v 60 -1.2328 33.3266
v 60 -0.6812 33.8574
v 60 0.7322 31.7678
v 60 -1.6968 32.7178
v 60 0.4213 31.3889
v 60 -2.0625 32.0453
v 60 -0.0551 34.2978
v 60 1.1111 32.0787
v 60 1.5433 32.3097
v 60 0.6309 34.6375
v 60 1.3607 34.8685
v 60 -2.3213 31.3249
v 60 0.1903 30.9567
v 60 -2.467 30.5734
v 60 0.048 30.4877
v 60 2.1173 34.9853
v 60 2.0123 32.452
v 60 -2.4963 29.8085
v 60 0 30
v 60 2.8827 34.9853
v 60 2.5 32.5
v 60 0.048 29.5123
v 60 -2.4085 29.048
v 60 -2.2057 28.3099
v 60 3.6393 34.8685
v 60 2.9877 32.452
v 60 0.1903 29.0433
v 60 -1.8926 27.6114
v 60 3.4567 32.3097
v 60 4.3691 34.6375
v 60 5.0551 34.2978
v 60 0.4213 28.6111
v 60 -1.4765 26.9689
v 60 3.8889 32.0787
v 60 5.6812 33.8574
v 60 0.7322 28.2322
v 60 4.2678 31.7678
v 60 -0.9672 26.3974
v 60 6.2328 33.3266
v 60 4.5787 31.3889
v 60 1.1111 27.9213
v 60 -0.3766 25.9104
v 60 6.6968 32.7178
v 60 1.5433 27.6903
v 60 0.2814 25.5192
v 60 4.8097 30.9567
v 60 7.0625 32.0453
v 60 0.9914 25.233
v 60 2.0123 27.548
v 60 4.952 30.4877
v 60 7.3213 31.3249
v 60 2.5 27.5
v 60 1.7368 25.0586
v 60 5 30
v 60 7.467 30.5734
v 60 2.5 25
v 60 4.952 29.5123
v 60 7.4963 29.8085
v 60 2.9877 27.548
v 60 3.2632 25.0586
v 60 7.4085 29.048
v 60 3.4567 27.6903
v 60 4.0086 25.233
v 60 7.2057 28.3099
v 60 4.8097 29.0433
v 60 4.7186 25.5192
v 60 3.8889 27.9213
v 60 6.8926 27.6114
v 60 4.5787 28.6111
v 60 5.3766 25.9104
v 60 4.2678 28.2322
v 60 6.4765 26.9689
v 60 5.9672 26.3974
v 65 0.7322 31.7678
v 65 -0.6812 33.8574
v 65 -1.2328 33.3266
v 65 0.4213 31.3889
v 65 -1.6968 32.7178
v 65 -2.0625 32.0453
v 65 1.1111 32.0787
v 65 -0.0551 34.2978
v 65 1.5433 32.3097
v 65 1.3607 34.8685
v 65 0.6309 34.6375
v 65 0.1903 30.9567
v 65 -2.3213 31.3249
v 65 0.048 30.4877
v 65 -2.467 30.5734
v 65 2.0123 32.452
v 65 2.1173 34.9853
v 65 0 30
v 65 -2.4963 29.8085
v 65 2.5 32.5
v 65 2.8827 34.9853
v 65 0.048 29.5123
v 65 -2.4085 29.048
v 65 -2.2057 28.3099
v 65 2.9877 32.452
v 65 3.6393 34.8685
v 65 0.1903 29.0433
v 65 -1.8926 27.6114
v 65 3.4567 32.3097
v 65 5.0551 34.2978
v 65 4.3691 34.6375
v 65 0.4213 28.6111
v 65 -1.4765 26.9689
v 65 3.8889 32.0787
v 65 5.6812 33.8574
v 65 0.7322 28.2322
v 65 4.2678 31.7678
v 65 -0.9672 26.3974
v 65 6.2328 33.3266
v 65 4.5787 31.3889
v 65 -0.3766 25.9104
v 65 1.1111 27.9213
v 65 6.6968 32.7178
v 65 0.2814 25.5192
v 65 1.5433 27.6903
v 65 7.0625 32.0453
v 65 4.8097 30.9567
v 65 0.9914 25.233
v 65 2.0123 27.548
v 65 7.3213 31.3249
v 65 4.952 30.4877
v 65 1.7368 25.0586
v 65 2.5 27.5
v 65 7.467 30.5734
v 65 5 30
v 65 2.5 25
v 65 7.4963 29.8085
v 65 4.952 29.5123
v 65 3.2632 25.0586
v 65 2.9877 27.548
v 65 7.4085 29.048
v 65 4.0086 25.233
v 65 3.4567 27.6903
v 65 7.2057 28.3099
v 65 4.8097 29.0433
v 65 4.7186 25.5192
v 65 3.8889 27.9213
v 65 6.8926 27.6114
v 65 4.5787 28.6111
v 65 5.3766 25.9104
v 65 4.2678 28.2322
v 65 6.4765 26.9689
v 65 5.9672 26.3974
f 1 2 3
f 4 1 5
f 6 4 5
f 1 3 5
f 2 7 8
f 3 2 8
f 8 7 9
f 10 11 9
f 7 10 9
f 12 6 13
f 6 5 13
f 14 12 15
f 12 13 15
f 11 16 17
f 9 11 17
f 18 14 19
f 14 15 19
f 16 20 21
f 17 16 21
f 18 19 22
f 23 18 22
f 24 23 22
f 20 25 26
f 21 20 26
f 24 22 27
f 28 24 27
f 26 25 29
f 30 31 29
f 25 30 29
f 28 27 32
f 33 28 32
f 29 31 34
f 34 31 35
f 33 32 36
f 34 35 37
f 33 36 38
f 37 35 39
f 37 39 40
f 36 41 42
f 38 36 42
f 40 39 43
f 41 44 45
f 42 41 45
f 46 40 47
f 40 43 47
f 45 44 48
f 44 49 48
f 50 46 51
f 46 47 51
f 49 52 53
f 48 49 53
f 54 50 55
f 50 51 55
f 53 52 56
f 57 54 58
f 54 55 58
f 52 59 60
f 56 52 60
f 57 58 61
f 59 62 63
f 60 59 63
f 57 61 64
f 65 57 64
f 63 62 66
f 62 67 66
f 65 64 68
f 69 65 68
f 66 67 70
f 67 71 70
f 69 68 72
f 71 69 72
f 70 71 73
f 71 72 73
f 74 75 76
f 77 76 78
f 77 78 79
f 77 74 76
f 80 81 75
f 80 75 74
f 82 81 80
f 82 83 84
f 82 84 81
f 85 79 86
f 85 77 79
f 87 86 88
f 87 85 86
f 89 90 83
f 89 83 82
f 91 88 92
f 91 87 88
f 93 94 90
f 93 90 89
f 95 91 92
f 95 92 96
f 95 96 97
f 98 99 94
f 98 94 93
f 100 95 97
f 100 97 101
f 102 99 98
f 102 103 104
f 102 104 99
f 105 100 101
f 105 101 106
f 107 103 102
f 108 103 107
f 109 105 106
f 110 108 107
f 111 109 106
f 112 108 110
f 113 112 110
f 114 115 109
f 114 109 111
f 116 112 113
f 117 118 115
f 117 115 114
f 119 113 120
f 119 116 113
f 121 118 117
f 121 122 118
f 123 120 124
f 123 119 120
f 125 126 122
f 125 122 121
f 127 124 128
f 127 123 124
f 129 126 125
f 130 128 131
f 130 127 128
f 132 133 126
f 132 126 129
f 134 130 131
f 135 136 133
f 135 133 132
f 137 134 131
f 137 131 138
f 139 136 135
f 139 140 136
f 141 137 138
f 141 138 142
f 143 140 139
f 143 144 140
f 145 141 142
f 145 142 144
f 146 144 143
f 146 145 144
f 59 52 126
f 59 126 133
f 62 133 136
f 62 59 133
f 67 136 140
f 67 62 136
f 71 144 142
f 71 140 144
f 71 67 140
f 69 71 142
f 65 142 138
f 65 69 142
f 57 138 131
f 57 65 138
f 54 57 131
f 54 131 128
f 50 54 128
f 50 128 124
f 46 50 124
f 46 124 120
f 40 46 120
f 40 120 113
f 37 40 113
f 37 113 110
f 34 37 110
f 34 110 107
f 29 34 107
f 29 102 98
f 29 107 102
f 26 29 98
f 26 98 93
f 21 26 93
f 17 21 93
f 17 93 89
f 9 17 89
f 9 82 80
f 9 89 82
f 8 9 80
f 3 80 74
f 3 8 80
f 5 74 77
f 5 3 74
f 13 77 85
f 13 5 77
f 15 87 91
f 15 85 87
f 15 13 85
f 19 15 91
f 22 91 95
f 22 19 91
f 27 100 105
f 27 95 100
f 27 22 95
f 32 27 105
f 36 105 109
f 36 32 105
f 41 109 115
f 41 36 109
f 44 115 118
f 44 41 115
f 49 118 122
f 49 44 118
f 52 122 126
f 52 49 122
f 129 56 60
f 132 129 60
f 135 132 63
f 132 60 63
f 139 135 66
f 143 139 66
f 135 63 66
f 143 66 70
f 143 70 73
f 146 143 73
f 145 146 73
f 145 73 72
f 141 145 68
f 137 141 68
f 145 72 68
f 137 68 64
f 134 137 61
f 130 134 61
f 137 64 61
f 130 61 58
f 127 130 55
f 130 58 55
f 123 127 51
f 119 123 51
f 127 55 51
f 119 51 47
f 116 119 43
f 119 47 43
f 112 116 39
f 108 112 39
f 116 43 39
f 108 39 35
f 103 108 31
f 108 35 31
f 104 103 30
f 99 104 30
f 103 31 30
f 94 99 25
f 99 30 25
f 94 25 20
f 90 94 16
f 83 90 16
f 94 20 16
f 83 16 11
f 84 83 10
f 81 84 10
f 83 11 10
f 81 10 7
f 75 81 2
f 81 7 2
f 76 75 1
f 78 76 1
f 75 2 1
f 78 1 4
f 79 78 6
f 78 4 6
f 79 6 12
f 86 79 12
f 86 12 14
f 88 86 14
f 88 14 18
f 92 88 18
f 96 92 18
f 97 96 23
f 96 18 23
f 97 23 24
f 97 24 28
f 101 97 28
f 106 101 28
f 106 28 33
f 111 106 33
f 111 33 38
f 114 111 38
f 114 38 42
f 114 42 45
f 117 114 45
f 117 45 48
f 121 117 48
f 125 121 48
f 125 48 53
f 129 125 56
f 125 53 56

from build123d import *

# Parameters (mm, degrees)
CYLINDER017_R          = 2.5
CYLINDER017_DEPTH      = 25
CYLINDER016_R          = 5
CYLINDER016_DEPTH      = 5
CUT010_PLACEMENT_ANGLE = 90


with BuildPart() as rotor007:
    # Cylinder017 → Cylinder017 (new body)
    with BuildSketch(Plane(origin=(25, 25, 43), x_dir=(1, 0, 0), z_dir=(0, 0, 1))):
        Circle(CYLINDER017_R)
    extrude(amount=CYLINDER017_DEPTH)


with BuildPart() as e001:
    # Cylinder016 → Cylinder016 (new body)
    with BuildSketch(Plane(origin=(25, 25, 49), x_dir=(1, 0, 0), z_dir=(0, 0, 1))):
        Circle(CYLINDER016_R)
    extrude(amount=CYLINDER016_DEPTH)

    # Cut010: cut Rotor007
    add(rotor007.part, mode=Mode.SUBTRACT)


with BuildPart() as e001_1:
    # Cut010 placement: moved
    add(e001.part.moved(Location((11, -22.5, 55))).rotate(Axis((11, -22.5, 55), (0, 1, 0)), CUT010_PLACEMENT_ANGLE))


solid = e001_1.part
